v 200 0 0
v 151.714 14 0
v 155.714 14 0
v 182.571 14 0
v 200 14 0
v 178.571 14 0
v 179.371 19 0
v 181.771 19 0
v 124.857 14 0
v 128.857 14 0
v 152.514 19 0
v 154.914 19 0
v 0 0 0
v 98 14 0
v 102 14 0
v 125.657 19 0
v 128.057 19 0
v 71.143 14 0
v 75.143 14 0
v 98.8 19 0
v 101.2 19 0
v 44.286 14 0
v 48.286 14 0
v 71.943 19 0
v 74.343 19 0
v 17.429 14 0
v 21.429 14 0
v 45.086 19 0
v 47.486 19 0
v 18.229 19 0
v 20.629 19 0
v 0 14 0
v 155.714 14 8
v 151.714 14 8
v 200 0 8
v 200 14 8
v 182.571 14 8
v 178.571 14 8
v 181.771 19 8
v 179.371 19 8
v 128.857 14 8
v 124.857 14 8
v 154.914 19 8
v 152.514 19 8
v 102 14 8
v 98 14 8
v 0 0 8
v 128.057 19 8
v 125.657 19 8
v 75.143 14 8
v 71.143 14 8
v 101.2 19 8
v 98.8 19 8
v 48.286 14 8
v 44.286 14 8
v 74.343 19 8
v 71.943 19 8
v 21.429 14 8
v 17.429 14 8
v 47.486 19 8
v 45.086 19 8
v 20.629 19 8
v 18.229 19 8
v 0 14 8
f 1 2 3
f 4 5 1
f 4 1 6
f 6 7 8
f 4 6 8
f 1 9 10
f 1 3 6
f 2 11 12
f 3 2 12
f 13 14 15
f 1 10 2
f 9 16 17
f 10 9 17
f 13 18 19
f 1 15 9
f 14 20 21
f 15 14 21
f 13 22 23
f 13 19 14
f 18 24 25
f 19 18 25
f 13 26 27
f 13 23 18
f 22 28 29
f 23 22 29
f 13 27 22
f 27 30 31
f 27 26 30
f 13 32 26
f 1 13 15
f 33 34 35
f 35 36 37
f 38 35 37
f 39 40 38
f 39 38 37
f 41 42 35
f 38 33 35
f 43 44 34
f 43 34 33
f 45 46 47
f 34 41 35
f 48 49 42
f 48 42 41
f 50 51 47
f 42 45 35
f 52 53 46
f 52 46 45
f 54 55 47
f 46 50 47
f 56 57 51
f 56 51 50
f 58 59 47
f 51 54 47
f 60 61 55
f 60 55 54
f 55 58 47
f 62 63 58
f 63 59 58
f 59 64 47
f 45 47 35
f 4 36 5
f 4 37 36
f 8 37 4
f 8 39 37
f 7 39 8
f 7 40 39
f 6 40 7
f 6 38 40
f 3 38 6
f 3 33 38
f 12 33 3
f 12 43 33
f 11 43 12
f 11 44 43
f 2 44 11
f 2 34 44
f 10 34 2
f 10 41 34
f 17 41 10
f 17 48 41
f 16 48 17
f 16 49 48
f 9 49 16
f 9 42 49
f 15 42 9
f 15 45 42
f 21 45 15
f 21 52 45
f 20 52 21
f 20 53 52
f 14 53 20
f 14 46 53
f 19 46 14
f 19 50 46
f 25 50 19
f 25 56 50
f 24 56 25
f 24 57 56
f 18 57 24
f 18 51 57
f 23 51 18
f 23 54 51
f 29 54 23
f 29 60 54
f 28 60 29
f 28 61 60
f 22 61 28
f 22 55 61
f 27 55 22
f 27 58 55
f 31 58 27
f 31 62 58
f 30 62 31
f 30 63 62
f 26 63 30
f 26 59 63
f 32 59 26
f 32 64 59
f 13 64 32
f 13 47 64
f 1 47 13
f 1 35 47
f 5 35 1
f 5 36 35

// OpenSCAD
$fn = 32;

// ----------------------------------------------------------------------
// Gear rack: 7 teeth on a 200 mm bar, pitch 26.86 mm
// ----------------------------------------------------------------------

// --- parameters (mm) ---
profile_height = 8;       // extrusion height
profile_points = 32;      // points of the closed outline

profile = [[0, 0], [200, 0], [200, 14], [182.571, 14], [181.771, 19], [179.371, 19], [178.571, 14], [155.714, 14], [154.914, 19], [152.514, 19], [151.714, 14], [128.857, 14], [128.057, 19], [125.657, 19], [124.857, 14], [102, 14], [101.2, 19], [98.8, 19], [98, 14], [75.143, 14], [74.343, 19], [71.943, 19], [71.143, 14], [48.286, 14], [47.486, 19], [45.086, 19], [44.286, 14], [21.429, 14], [20.629, 19], [18.229, 19], [17.429, 14], [0, 14]];  // single closed polygon, 32 points, counter clockwise

// --- the one profile operation ---
linear_extrude(height = profile_height) polygon(points = profile);
